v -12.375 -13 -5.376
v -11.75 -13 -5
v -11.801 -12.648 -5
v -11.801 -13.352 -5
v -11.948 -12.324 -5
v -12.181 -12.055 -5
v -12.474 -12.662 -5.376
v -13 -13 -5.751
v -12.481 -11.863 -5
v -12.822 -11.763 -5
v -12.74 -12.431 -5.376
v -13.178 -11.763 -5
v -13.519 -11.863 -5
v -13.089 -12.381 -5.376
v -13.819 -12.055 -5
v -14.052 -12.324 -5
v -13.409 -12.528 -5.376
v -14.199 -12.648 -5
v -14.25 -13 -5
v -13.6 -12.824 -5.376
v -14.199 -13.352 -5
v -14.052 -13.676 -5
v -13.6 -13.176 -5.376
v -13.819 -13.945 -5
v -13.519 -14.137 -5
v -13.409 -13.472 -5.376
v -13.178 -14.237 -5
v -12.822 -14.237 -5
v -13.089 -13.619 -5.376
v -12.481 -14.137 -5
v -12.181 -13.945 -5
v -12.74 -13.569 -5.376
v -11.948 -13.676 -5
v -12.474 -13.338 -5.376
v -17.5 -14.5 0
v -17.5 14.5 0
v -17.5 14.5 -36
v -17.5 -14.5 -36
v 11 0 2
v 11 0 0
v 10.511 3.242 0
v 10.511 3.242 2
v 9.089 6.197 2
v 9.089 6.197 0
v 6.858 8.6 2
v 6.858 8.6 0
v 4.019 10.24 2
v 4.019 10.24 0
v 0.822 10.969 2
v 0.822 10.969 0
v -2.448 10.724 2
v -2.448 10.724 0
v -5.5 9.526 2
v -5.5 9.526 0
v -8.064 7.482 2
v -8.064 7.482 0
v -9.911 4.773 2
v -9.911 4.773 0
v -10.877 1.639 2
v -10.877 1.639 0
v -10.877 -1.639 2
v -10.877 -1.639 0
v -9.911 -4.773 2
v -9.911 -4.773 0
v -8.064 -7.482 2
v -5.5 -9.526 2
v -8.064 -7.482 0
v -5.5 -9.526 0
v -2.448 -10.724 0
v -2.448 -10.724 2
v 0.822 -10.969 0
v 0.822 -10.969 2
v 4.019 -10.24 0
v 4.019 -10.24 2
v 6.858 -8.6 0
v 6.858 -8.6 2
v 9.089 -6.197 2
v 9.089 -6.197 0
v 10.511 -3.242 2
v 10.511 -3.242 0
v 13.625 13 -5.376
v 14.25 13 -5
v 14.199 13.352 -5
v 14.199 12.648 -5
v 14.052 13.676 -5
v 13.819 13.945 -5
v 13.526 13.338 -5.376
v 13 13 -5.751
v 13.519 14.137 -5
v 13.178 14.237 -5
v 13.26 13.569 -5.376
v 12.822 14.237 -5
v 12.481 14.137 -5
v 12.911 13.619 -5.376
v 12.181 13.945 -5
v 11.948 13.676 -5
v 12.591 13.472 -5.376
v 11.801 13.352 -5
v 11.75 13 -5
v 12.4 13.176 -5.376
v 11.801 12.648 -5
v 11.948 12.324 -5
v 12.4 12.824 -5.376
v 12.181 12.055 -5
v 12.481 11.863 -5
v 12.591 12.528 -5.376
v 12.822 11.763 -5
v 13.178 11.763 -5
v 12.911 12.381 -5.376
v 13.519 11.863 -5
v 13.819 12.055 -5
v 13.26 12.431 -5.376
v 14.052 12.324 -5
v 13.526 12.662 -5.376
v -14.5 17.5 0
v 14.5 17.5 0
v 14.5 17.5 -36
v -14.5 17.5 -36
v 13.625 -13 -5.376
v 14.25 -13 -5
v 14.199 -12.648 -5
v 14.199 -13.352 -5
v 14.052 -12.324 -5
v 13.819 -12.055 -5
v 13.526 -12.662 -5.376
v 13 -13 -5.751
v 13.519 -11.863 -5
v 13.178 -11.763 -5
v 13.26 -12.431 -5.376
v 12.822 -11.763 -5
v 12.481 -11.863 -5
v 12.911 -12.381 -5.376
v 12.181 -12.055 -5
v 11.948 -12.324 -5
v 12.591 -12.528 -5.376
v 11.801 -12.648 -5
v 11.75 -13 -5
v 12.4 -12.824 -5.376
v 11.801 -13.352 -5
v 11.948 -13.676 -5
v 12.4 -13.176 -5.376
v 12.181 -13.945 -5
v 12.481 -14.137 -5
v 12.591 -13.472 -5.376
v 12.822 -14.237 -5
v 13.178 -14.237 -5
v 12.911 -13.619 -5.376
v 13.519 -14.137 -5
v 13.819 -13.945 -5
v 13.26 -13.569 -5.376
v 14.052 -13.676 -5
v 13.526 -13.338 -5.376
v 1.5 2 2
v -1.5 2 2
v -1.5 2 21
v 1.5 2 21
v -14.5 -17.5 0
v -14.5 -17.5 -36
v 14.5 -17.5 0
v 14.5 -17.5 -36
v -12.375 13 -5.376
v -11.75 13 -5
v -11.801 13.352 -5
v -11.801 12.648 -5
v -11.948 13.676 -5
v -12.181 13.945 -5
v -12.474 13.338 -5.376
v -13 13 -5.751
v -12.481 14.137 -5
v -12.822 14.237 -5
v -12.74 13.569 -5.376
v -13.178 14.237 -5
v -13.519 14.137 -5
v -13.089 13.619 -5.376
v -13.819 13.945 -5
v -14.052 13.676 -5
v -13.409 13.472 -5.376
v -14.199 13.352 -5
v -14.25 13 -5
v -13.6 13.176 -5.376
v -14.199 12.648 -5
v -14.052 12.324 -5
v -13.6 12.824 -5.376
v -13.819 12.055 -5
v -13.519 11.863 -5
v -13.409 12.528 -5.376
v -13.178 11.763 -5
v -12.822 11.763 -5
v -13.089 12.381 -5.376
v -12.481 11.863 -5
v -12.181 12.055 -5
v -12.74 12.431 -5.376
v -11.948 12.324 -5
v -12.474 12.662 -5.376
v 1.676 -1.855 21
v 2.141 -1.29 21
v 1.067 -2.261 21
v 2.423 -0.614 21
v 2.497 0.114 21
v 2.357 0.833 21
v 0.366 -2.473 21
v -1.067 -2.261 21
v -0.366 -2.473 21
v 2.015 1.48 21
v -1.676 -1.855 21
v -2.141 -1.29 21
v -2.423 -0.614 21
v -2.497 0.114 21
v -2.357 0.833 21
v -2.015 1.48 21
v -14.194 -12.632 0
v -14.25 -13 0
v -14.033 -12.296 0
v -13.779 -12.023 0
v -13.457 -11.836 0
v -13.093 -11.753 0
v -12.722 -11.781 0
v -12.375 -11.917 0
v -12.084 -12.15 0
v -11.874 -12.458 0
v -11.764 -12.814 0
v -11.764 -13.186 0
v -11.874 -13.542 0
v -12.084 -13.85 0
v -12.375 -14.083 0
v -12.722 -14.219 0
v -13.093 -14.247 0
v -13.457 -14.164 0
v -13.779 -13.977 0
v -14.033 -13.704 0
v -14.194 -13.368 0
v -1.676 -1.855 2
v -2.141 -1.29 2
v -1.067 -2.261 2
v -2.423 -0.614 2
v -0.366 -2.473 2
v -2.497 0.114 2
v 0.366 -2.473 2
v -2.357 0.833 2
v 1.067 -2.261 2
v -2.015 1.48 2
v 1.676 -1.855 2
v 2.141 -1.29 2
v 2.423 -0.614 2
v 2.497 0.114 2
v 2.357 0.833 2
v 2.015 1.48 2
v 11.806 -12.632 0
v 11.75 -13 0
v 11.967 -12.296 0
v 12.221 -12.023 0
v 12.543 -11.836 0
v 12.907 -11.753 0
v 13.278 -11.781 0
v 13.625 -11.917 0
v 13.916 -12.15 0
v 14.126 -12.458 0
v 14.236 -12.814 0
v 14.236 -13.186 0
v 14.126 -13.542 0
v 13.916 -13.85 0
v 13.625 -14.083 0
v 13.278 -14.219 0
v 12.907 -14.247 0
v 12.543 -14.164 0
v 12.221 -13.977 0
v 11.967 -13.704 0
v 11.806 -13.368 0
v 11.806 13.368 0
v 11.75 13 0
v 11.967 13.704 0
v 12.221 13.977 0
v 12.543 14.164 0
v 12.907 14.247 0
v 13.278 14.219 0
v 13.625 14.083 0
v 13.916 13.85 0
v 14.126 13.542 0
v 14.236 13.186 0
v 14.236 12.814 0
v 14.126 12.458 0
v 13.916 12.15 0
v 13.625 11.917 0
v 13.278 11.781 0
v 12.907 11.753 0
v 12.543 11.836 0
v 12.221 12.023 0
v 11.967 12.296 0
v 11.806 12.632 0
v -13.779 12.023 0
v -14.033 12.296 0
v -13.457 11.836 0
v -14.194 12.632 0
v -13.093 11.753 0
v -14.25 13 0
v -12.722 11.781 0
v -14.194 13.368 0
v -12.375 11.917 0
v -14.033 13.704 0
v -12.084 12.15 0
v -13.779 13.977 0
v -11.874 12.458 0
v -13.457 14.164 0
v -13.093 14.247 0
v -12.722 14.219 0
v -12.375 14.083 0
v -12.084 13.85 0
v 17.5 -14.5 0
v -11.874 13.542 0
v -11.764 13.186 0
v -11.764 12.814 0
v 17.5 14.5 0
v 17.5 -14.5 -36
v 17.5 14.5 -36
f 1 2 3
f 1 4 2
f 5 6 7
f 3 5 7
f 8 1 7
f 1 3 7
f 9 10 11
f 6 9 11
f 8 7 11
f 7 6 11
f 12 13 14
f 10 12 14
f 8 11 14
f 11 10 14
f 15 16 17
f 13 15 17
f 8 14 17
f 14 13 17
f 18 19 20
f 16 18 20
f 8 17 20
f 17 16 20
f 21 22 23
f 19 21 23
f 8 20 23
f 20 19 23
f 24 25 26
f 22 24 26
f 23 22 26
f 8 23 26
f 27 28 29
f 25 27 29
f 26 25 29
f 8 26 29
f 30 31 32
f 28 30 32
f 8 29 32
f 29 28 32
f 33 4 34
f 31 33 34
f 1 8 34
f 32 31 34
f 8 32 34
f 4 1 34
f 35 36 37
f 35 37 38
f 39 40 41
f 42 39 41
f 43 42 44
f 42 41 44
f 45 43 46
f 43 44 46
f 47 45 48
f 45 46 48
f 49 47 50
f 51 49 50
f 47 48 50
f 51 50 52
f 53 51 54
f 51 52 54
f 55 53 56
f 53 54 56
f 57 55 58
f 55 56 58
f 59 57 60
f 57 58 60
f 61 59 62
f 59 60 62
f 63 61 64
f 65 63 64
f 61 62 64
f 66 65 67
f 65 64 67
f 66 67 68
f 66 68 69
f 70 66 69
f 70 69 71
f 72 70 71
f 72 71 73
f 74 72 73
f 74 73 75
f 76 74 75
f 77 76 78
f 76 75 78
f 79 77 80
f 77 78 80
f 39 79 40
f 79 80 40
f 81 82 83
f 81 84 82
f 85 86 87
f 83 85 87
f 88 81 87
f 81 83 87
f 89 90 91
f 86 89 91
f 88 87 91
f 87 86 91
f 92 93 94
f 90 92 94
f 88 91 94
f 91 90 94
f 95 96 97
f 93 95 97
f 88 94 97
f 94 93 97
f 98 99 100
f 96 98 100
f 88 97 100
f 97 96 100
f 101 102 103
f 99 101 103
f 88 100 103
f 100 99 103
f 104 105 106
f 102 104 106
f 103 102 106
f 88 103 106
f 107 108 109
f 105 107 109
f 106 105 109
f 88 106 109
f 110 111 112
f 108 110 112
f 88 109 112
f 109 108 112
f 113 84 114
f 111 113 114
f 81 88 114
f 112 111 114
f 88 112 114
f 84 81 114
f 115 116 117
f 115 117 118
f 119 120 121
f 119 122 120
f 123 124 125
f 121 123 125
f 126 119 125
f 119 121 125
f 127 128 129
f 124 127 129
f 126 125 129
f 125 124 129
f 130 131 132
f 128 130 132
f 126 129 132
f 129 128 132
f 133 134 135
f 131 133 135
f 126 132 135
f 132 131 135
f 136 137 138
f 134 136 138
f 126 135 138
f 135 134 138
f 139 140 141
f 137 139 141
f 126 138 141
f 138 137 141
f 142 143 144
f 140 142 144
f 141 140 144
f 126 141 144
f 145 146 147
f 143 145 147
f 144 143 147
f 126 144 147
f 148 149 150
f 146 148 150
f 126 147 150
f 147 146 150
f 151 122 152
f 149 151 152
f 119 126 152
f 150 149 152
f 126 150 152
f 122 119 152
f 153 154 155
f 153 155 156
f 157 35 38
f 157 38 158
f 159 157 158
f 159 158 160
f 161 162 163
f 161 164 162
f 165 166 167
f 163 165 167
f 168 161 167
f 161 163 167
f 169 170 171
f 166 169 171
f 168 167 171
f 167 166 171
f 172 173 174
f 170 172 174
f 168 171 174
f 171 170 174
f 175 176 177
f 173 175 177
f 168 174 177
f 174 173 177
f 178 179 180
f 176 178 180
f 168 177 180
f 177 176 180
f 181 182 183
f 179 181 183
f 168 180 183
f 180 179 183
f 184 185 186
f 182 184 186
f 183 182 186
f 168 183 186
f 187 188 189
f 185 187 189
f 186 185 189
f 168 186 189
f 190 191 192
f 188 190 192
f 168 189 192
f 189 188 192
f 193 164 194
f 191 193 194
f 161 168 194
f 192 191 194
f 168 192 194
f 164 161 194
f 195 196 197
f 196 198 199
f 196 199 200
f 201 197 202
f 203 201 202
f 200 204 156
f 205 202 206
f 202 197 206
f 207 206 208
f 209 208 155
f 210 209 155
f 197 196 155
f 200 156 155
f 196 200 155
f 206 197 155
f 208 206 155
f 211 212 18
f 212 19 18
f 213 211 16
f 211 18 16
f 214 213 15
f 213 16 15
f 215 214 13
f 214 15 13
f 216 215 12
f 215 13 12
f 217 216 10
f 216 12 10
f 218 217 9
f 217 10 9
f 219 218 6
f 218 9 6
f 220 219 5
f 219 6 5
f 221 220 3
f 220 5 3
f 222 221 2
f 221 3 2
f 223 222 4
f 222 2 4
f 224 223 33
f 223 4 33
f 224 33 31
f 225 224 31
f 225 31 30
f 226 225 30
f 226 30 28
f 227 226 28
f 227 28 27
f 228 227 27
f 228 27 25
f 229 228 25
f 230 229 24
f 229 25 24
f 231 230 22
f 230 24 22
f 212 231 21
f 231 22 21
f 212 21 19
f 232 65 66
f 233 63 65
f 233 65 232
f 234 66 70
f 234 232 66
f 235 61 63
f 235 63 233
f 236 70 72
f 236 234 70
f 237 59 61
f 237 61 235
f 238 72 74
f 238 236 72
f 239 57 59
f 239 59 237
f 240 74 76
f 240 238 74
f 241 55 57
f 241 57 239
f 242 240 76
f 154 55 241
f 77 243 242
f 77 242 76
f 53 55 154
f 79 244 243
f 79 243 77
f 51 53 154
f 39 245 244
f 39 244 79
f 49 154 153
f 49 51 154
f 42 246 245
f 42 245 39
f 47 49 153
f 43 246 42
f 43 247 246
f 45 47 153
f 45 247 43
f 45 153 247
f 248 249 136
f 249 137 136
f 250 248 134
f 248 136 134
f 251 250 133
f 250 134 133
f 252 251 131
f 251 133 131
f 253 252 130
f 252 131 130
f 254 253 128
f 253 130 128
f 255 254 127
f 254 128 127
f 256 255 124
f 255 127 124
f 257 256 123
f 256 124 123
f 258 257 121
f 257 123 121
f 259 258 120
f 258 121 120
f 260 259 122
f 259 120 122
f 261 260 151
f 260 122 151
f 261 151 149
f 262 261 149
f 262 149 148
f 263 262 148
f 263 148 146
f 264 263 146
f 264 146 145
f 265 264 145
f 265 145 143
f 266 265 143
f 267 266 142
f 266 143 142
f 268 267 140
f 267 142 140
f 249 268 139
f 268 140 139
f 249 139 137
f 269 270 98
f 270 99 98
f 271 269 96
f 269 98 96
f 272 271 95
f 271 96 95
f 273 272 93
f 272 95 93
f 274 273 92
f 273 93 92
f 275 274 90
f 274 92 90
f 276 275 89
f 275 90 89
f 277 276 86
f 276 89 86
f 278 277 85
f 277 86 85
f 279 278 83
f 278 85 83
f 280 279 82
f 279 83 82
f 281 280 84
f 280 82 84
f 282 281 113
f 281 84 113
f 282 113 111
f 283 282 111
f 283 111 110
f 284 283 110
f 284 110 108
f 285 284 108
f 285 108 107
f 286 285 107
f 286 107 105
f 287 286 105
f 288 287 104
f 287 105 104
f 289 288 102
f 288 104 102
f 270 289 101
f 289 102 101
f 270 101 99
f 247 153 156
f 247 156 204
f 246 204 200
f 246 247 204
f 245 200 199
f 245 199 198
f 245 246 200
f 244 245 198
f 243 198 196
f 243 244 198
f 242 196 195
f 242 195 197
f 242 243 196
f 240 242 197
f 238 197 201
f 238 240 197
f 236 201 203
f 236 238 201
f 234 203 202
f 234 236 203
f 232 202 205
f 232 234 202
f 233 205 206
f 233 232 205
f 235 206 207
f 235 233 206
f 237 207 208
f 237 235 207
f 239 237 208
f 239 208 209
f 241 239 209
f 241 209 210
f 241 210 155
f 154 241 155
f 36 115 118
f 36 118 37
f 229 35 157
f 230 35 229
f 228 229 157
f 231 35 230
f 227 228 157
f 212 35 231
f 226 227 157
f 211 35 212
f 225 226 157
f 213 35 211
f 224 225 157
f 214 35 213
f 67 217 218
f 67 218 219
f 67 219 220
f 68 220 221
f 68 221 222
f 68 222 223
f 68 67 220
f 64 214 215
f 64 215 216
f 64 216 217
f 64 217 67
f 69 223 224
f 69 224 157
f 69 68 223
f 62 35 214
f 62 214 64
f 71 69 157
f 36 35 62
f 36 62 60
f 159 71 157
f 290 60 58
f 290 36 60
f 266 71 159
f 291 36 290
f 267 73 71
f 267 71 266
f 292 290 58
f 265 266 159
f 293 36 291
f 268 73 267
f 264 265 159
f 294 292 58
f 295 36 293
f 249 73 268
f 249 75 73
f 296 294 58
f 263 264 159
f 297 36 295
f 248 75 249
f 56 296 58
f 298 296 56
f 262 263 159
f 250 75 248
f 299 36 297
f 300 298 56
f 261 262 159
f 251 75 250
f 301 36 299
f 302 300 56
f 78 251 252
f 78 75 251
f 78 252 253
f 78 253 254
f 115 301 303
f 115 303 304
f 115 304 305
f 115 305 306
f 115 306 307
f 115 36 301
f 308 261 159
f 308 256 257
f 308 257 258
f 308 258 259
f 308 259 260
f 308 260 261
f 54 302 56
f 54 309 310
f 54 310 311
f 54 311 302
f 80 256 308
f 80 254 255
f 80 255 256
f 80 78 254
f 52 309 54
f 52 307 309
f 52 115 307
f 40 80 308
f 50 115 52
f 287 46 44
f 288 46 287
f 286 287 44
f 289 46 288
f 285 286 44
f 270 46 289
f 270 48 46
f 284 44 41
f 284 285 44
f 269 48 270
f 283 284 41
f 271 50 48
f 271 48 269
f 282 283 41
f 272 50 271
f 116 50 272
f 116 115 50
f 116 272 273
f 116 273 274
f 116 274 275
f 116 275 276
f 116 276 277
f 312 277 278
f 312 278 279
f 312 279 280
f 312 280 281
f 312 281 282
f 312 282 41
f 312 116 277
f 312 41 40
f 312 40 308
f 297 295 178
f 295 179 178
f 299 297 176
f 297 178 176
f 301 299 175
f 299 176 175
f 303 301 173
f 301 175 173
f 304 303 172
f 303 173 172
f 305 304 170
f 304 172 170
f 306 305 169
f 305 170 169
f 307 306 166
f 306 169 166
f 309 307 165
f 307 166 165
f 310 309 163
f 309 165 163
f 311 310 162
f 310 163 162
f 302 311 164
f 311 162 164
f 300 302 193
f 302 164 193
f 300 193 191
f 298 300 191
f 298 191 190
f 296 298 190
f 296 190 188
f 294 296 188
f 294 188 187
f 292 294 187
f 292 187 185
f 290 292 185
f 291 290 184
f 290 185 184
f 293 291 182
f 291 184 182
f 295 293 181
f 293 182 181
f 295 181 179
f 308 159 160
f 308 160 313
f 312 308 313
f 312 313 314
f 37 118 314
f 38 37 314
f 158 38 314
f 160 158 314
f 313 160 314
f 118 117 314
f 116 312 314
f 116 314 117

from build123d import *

# Parameters (mm, degrees)
BOSS_EXTRUDE1_DEPTH       = 36
SKETCH1_3_R               = 11
BOSS_EXTRUDE2_DEPTH       = 2
M3X0_5_TAPPED_HOLE1_D     = 2.5
M3X0_5_TAPPED_HOLE1_DEPTH = 5
M3X0_5_TAPPED_HOLE1_TIP   = 0.751075774
BOSS_EXTRUDE3_DEPTH       = 21


with BuildPart() as part:
    # Sketch1 → Boss-Extrude1 (new body)
    with BuildSketch(Plane.XY):
        Polygon((-14.5, 17.5), (-17.5, 14.5), (-17.5, -14.5), (-14.5, -17.5), (14.5, -17.5), (17.5, -14.5), (17.5, 14.5), (14.5, 17.5), align=None)
    extrude(amount=-BOSS_EXTRUDE1_DEPTH)

    # Sketch1<3> → Boss-Extrude2 (add)
    with BuildSketch(Plane.XY):
        Circle(SKETCH1_3_R)
    extrude(amount=BOSS_EXTRUDE2_DEPTH)

    # M3x0.5 Tapped Hole1
    with Locations(Plane.XY):
        with Locations((13, 13), (-13, 13), (-13, -13), (13, -13)):
            Hole(M3X0_5_TAPPED_HOLE1_D / 2, depth=M3X0_5_TAPPED_HOLE1_DEPTH)
            with Locations((0, 0, -(M3X0_5_TAPPED_HOLE1_DEPTH + M3X0_5_TAPPED_HOLE1_TIP / 2))):  # 118° drill point
                Cone(0, M3X0_5_TAPPED_HOLE1_D / 2, M3X0_5_TAPPED_HOLE1_TIP, mode=Mode.SUBTRACT)

    # Sketch1<4> → Boss-Extrude3 (add)
    with BuildSketch(Plane.XY):
        with BuildLine():
            Line((1.5, 2), (-1.5, 2))
            ThreePointArc((-1.5, 2), (0, -2.5), (1.5, 2))
        make_face()
    extrude(amount=BOSS_EXTRUDE3_DEPTH)


solid = part.part
